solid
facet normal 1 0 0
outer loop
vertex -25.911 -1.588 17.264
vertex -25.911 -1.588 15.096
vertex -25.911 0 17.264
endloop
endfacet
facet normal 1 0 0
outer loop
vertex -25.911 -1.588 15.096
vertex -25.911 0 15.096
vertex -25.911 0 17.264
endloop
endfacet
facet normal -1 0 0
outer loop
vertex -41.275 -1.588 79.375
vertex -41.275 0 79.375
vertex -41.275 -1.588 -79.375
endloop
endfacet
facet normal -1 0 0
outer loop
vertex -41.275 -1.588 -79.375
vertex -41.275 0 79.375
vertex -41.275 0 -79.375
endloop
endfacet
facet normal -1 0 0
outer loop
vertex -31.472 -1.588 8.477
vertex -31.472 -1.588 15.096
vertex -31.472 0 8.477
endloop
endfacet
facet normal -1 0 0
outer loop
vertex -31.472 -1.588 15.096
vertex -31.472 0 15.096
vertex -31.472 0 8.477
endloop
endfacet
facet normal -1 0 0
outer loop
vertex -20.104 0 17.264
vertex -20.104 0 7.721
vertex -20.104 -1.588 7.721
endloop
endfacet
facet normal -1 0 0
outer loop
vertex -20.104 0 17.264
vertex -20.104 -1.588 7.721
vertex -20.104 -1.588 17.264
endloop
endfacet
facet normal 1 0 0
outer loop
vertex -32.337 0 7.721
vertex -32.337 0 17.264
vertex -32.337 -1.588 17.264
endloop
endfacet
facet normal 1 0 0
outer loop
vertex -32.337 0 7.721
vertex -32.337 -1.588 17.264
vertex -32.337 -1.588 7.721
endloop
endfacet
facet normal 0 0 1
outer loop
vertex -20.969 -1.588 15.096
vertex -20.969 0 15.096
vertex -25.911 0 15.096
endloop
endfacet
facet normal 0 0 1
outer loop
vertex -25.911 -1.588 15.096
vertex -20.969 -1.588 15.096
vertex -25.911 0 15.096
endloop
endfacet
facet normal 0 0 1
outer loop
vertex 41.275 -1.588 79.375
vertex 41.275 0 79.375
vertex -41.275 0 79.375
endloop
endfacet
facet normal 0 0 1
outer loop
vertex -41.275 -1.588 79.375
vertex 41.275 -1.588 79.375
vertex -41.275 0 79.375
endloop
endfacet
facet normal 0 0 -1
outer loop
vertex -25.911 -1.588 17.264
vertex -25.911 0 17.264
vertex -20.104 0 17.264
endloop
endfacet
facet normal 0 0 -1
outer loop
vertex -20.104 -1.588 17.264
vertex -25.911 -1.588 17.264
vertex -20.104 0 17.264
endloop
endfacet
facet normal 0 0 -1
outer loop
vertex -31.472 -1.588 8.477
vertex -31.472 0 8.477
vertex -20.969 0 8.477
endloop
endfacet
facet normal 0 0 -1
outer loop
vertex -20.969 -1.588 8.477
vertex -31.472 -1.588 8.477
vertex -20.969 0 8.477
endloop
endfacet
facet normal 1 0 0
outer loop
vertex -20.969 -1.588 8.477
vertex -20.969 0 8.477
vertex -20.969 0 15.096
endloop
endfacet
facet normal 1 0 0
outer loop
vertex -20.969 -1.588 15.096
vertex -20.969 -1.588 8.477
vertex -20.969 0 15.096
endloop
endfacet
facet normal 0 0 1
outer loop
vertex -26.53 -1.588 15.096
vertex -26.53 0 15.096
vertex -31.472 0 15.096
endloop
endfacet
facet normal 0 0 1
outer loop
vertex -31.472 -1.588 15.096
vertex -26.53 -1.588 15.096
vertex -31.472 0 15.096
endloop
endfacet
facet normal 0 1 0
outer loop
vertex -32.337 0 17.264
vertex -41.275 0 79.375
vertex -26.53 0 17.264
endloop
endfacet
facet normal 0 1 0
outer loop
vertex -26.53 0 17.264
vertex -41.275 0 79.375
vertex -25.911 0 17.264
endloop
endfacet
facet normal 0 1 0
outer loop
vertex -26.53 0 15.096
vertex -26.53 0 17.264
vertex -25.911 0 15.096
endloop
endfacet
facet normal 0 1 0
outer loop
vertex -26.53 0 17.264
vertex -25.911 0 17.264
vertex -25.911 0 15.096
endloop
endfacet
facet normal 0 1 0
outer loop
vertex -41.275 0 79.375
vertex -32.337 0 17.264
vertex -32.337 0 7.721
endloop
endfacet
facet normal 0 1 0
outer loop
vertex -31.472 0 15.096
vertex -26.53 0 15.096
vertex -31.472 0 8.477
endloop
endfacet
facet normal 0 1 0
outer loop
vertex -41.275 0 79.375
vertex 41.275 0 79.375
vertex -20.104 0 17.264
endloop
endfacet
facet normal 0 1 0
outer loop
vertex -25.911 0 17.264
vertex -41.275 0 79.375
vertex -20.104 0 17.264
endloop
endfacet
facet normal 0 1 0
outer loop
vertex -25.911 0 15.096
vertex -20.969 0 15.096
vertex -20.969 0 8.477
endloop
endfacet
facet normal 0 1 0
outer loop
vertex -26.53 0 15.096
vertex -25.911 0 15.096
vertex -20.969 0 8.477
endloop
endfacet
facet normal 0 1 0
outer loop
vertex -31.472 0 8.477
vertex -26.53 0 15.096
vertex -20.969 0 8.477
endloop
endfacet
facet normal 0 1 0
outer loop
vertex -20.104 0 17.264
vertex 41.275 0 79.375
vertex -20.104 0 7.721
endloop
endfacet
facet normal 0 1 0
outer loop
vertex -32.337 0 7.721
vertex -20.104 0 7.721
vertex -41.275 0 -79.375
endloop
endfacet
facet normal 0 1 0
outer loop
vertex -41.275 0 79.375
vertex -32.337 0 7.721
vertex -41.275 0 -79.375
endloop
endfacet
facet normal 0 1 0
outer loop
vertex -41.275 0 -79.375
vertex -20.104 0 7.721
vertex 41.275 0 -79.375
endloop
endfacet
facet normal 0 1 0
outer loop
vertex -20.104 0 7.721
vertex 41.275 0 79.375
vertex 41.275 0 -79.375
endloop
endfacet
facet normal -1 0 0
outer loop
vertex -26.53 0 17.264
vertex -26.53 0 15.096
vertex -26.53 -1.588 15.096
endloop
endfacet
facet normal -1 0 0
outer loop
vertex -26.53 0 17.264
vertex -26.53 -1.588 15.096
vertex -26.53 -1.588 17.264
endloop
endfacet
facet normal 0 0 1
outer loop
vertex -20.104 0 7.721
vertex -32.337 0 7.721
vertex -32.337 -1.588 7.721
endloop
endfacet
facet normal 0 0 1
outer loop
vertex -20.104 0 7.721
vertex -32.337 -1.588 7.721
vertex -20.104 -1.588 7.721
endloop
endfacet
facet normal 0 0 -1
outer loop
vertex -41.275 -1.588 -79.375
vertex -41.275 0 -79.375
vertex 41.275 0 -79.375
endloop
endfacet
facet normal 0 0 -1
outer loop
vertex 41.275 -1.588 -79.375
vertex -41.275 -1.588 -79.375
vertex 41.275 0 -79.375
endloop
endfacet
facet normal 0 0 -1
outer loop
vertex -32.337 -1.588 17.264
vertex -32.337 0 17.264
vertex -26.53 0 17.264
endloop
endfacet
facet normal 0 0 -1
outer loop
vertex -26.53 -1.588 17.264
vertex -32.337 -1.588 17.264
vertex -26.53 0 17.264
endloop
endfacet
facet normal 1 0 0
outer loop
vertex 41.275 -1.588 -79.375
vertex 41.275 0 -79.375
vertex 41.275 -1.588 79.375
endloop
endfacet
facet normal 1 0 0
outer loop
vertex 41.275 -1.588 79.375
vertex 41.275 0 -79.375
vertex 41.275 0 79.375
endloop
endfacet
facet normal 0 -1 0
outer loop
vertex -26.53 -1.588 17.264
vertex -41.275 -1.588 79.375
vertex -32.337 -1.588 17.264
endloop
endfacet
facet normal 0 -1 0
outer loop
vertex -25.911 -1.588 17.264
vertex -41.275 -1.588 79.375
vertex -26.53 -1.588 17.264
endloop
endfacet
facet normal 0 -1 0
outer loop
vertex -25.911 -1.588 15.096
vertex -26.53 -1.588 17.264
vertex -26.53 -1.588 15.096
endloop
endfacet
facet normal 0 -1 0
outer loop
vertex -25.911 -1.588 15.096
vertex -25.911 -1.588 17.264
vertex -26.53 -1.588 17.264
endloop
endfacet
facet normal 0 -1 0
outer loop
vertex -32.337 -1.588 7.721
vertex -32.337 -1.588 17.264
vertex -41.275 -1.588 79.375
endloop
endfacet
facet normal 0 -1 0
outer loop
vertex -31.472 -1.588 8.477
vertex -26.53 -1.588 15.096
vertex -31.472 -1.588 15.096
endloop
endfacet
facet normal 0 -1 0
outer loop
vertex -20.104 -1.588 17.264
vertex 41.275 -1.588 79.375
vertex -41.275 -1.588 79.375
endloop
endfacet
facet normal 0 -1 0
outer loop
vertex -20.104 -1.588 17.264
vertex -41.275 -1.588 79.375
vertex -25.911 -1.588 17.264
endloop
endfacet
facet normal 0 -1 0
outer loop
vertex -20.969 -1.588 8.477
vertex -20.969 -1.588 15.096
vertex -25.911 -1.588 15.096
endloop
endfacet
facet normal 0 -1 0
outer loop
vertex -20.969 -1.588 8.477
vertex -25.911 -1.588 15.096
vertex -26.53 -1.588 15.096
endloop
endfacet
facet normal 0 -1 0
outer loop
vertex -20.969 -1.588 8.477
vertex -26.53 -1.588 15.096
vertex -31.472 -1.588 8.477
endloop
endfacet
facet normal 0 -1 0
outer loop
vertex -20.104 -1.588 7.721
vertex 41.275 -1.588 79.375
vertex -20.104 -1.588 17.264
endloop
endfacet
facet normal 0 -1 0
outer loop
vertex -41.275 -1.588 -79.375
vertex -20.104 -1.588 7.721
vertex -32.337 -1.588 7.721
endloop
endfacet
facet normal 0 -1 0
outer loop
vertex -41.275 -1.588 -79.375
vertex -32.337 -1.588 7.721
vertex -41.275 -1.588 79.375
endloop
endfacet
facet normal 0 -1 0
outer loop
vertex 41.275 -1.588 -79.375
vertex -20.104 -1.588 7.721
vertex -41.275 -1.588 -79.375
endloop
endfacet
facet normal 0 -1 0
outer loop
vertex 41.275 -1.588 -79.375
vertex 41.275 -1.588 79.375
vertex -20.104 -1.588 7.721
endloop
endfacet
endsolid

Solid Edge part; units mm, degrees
sketch "Sketch1" plane through (0, 0, 0) normal (0, -1, 0) x (1, 0, 0)
  line L0 (41.275, -79.375) -> (41.275, 79.375)
  line L1 (41.275, 79.375) -> (-41.275, 79.375)
  line L2 (-41.275, 79.375) -> (-41.275, -79.375)
  line L3 (-41.275, -79.375) -> (41.275, -79.375)
extrude "Protrusion1" add sketch "Sketch1" along normal blind 1.5875
sketch "Sketch2" plane through (0, 0, 0) normal (0, -1, 0) x (1, 0, 0)
  line L0 (-25.9111, 15.0957) -> (-25.9111, 17.2637)
  line L1 (-25.9111, 17.2637) -> (-20.1037, 17.2637)
  line L2 (-20.1037, 7.7211) -> (-20.1037, 17.2637)
  line L3 (-32.337, 7.7211) -> (-20.1037, 7.7211)
  line L4 (-32.337, 17.2637) -> (-32.337, 7.7211)
  line L5 (-32.337, 17.2637) -> (-26.5296, 17.2637)
  line L6 (-26.5296, 15.0957) -> (-26.5296, 17.2637)
  line L7 (-26.5296, 15.0957) -> (-31.472, 15.0957)
  line L8 (-31.472, 15.0957) -> (-31.472, 8.4771)
  line L9 (-31.472, 8.4771) -> (-20.9687, 8.4771)
  line L10 (-20.9687, 8.4771) -> (-20.9687, 15.0957)
  line L11 (-20.9687, 15.0957) -> (-25.9111, 15.0957)
extrude "Cutout1" cut sketch "Sketch2" along normal through all
